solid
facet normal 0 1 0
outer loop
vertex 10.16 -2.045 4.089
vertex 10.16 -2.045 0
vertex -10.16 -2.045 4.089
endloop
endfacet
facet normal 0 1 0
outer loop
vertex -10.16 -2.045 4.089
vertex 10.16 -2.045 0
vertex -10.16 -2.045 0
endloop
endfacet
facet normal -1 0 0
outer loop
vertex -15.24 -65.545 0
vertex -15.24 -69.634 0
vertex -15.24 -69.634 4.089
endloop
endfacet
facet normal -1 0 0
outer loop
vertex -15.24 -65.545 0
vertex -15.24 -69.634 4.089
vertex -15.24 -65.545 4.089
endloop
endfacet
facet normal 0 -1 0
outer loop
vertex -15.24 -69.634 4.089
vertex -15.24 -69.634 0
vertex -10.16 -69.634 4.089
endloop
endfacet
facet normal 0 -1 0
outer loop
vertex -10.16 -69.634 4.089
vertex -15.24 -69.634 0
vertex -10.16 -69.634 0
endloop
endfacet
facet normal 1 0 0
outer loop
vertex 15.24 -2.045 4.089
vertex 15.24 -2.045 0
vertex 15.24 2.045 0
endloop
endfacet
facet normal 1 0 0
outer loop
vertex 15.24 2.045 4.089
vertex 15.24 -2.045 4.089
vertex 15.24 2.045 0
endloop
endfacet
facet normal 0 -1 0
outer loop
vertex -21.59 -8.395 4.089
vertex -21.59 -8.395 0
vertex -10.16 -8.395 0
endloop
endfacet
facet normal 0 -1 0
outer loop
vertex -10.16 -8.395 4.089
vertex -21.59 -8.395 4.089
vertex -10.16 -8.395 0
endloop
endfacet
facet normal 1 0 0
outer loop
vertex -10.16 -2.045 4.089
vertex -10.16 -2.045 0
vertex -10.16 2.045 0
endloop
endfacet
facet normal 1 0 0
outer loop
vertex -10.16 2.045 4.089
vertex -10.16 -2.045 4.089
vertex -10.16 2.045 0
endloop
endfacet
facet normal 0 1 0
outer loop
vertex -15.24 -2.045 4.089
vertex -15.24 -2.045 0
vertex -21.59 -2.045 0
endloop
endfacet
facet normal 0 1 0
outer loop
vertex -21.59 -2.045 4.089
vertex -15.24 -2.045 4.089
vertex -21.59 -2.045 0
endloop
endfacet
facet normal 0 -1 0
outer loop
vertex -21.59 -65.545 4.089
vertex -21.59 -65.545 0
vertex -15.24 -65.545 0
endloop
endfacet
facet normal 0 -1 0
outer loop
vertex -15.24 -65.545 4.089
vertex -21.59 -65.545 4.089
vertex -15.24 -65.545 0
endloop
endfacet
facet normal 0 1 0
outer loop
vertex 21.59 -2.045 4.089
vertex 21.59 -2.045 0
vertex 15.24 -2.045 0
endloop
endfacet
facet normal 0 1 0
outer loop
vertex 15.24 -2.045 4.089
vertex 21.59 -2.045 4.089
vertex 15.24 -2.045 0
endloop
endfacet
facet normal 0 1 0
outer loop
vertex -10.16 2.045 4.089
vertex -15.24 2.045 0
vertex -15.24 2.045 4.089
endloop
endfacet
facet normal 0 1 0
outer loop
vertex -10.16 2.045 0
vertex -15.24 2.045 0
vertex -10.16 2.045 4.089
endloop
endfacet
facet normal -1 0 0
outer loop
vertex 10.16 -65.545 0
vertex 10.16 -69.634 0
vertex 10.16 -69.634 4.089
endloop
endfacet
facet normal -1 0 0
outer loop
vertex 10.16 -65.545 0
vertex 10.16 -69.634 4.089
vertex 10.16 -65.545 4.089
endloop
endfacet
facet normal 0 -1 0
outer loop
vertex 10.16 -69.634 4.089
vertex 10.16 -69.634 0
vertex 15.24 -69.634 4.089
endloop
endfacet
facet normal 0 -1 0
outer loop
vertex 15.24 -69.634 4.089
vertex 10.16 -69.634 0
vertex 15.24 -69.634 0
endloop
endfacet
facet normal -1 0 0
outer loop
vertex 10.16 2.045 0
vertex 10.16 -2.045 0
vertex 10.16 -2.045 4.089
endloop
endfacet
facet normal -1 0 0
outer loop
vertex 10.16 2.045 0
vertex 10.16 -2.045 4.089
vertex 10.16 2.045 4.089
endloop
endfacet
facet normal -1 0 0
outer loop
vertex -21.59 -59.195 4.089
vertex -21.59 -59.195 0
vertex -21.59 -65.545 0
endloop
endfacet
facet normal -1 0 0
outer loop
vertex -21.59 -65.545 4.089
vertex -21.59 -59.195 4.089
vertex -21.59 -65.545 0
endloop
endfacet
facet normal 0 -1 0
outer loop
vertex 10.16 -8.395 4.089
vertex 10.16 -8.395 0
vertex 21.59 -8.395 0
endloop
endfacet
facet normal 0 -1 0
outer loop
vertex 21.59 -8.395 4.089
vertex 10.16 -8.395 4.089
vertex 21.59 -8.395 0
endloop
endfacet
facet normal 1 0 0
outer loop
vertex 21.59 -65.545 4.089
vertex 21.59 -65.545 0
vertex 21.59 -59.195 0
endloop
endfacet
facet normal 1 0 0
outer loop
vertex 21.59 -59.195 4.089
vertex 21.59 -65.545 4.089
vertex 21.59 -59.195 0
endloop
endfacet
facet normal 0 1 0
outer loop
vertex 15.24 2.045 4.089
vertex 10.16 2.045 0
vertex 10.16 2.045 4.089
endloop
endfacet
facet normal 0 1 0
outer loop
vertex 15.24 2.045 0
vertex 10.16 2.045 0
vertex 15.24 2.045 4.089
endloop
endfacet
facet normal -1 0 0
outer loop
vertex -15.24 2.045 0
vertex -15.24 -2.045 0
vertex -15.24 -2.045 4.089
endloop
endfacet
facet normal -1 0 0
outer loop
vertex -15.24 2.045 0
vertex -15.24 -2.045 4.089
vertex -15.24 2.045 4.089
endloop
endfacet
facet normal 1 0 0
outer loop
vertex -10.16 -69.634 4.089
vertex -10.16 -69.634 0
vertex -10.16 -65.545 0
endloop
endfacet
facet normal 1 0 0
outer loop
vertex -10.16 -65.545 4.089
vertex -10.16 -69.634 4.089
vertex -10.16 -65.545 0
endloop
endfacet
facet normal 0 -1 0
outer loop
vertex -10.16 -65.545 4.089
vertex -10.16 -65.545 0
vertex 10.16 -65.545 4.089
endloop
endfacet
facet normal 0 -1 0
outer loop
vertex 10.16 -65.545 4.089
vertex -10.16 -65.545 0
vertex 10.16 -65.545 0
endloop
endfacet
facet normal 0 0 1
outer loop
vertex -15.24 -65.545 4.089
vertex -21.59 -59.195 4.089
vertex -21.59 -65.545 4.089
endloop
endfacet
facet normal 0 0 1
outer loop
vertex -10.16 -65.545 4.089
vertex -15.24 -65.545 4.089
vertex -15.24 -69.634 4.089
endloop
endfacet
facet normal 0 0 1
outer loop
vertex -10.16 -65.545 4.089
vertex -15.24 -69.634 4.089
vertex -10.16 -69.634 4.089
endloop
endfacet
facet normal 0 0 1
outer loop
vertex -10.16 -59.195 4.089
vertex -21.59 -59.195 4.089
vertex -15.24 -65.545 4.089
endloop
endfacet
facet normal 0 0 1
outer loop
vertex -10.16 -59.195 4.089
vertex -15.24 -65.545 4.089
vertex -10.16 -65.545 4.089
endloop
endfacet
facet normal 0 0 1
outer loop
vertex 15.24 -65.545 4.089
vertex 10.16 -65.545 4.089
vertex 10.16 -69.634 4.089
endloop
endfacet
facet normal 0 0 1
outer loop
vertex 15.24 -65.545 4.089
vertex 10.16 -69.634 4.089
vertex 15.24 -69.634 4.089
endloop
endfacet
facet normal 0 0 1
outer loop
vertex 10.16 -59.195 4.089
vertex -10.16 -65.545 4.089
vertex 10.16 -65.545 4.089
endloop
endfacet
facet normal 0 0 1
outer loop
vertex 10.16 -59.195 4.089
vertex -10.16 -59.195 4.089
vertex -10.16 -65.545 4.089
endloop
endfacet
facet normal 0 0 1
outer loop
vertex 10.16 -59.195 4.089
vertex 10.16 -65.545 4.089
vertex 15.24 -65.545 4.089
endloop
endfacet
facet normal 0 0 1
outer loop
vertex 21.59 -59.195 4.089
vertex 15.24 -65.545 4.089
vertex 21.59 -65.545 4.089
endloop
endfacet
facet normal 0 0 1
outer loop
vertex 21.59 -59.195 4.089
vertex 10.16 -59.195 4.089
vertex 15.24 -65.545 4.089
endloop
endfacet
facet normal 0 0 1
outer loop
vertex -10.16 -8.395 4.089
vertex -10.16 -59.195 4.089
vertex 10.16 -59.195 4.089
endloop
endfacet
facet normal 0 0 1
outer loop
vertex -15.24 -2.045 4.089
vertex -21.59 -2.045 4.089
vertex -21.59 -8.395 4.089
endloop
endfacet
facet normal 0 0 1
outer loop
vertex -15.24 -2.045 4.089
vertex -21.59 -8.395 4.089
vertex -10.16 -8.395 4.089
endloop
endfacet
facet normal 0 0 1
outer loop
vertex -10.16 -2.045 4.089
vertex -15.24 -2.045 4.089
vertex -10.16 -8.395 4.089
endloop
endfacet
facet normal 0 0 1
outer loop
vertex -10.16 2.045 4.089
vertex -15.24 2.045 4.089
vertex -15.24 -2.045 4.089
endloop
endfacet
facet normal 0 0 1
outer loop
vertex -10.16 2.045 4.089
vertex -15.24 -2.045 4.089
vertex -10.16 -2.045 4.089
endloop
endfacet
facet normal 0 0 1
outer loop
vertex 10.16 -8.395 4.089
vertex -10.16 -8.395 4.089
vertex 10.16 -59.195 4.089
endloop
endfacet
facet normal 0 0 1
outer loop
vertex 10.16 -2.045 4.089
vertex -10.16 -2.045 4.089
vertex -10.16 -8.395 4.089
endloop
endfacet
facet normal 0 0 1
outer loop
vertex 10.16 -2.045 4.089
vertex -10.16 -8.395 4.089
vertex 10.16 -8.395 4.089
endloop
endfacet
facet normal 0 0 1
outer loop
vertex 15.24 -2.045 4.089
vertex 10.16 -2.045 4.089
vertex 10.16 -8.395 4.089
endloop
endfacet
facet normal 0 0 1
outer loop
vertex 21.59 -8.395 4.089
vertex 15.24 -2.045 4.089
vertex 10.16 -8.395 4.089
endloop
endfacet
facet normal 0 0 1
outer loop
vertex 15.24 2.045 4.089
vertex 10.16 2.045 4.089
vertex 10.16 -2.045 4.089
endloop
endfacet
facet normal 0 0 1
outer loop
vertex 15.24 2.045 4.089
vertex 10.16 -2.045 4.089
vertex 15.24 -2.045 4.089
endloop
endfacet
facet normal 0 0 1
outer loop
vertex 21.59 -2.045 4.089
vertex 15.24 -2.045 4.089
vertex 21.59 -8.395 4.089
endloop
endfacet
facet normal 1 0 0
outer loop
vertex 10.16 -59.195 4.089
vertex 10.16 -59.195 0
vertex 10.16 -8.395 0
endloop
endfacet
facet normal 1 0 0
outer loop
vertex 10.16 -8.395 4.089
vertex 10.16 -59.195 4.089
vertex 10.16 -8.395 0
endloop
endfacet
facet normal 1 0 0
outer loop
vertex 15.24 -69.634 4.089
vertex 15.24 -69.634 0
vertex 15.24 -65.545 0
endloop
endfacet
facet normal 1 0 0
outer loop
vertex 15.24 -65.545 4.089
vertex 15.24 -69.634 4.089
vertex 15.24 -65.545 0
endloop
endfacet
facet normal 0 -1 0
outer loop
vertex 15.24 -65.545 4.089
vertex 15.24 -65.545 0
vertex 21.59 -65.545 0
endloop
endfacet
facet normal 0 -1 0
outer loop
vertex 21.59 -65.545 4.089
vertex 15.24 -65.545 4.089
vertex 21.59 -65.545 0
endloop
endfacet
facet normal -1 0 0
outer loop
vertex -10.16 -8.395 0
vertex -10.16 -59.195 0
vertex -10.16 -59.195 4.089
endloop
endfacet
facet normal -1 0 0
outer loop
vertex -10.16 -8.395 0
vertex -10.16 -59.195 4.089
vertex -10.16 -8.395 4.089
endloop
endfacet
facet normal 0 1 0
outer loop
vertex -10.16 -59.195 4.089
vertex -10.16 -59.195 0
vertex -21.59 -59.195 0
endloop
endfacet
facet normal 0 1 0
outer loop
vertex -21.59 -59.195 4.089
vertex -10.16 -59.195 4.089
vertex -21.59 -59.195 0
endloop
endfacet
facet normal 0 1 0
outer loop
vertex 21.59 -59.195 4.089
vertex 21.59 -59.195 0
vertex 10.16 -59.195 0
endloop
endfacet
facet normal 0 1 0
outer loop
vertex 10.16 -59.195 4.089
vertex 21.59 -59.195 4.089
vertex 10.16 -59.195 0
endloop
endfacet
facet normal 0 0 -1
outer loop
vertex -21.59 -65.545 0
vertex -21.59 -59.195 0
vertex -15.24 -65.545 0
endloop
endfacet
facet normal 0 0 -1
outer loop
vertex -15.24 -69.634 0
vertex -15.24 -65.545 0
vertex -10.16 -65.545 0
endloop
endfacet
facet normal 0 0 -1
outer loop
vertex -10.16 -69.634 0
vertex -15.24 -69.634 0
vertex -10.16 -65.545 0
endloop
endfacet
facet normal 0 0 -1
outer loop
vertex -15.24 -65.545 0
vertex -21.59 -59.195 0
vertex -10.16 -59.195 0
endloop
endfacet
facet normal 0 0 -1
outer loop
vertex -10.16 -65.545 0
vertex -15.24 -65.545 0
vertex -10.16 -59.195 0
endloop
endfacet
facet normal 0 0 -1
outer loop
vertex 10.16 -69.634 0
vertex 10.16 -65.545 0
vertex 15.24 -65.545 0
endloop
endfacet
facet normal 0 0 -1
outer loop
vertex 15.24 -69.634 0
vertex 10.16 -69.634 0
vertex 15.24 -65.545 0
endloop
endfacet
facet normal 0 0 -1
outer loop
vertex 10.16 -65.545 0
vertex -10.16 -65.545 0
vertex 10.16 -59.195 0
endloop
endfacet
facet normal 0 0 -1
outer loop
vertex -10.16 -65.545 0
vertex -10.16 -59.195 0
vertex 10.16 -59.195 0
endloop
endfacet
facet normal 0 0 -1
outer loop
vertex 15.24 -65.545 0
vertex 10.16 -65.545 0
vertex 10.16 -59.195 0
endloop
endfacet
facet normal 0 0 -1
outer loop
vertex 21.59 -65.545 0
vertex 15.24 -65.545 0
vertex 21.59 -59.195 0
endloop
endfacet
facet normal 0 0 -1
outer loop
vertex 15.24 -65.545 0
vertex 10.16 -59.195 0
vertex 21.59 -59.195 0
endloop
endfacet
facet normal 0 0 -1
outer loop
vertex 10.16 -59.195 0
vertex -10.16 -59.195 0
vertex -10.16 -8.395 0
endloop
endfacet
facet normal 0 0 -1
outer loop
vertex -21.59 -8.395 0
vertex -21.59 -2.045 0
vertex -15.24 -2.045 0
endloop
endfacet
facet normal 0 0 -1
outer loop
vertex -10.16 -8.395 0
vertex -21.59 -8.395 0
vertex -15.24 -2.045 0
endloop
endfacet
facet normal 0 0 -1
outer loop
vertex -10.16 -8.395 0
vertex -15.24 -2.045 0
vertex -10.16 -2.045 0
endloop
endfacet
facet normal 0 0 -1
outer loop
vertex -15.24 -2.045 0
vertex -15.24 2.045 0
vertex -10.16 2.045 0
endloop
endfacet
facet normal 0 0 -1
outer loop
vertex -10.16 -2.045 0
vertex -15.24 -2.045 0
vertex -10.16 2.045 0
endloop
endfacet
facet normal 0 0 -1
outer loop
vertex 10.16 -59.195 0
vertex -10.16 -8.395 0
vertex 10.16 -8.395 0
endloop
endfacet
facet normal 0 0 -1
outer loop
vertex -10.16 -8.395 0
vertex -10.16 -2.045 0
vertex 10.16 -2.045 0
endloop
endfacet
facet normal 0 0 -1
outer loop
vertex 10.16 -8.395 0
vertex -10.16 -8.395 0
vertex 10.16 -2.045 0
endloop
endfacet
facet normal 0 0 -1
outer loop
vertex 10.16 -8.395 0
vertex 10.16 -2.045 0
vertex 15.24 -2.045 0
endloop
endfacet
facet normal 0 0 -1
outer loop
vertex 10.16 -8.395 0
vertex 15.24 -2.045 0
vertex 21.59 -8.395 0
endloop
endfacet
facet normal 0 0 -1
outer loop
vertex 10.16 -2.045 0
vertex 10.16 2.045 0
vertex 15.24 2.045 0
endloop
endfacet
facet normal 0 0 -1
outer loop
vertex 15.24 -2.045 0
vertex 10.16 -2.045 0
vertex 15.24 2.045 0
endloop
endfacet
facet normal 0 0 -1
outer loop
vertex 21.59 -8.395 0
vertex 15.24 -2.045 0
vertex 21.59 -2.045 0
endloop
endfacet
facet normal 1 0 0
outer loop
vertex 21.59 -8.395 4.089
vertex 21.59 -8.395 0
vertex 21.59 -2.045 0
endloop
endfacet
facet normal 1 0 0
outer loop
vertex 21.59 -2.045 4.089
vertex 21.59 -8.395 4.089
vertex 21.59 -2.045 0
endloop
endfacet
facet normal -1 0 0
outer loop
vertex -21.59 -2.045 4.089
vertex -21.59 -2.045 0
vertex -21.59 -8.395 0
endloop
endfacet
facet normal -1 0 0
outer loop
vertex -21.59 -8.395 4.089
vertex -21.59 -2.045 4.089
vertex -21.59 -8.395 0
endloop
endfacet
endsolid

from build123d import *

# Parameters (mm, degrees)
F0_W     = 5.08
F0_H     = 4.0894
F0_W_2   = 20.32
F0_H_2   = 50.8
F1_DEPTH = 4.0894


with BuildPart() as f1:
    # F0 (on Top) → F1 (new body)
    with BuildSketch(Plane.XY):
        Polygon((21.59, -2.0447), (15.24, -2.0447), (10.16, -2.0447), (-10.16, -2.0447), (-15.24, -2.0447), (-21.59, -2.0447), (-21.59, -8.3947), (-10.16, -8.3947), (10.16, -8.3947), (21.59, -8.3947), align=None)
        with Locations((12.7, 0)):
            Rectangle(F0_W, F0_H)
        with Locations((-12.7, 0)):
            Rectangle(F0_W, F0_H)
        with Locations((0, -33.7947)):
            Rectangle(F0_W_2, F0_H_2)
        Polygon((21.59, -59.1947), (10.16, -59.1947), (-10.16, -59.1947), (-21.59, -59.1947), (-21.59, -65.5447), (-15.24, -65.5447), (-10.16, -65.5447), (10.16, -65.5447), (15.24, -65.5447), (21.59, -65.5447), align=None)
        with Locations((12.7, -67.5894)):
            Rectangle(F0_W, F0_H)
        with Locations((-12.7, -67.5894)):
            Rectangle(F0_W, F0_H)
    extrude(amount=F1_DEPTH)


solid = f1.part
